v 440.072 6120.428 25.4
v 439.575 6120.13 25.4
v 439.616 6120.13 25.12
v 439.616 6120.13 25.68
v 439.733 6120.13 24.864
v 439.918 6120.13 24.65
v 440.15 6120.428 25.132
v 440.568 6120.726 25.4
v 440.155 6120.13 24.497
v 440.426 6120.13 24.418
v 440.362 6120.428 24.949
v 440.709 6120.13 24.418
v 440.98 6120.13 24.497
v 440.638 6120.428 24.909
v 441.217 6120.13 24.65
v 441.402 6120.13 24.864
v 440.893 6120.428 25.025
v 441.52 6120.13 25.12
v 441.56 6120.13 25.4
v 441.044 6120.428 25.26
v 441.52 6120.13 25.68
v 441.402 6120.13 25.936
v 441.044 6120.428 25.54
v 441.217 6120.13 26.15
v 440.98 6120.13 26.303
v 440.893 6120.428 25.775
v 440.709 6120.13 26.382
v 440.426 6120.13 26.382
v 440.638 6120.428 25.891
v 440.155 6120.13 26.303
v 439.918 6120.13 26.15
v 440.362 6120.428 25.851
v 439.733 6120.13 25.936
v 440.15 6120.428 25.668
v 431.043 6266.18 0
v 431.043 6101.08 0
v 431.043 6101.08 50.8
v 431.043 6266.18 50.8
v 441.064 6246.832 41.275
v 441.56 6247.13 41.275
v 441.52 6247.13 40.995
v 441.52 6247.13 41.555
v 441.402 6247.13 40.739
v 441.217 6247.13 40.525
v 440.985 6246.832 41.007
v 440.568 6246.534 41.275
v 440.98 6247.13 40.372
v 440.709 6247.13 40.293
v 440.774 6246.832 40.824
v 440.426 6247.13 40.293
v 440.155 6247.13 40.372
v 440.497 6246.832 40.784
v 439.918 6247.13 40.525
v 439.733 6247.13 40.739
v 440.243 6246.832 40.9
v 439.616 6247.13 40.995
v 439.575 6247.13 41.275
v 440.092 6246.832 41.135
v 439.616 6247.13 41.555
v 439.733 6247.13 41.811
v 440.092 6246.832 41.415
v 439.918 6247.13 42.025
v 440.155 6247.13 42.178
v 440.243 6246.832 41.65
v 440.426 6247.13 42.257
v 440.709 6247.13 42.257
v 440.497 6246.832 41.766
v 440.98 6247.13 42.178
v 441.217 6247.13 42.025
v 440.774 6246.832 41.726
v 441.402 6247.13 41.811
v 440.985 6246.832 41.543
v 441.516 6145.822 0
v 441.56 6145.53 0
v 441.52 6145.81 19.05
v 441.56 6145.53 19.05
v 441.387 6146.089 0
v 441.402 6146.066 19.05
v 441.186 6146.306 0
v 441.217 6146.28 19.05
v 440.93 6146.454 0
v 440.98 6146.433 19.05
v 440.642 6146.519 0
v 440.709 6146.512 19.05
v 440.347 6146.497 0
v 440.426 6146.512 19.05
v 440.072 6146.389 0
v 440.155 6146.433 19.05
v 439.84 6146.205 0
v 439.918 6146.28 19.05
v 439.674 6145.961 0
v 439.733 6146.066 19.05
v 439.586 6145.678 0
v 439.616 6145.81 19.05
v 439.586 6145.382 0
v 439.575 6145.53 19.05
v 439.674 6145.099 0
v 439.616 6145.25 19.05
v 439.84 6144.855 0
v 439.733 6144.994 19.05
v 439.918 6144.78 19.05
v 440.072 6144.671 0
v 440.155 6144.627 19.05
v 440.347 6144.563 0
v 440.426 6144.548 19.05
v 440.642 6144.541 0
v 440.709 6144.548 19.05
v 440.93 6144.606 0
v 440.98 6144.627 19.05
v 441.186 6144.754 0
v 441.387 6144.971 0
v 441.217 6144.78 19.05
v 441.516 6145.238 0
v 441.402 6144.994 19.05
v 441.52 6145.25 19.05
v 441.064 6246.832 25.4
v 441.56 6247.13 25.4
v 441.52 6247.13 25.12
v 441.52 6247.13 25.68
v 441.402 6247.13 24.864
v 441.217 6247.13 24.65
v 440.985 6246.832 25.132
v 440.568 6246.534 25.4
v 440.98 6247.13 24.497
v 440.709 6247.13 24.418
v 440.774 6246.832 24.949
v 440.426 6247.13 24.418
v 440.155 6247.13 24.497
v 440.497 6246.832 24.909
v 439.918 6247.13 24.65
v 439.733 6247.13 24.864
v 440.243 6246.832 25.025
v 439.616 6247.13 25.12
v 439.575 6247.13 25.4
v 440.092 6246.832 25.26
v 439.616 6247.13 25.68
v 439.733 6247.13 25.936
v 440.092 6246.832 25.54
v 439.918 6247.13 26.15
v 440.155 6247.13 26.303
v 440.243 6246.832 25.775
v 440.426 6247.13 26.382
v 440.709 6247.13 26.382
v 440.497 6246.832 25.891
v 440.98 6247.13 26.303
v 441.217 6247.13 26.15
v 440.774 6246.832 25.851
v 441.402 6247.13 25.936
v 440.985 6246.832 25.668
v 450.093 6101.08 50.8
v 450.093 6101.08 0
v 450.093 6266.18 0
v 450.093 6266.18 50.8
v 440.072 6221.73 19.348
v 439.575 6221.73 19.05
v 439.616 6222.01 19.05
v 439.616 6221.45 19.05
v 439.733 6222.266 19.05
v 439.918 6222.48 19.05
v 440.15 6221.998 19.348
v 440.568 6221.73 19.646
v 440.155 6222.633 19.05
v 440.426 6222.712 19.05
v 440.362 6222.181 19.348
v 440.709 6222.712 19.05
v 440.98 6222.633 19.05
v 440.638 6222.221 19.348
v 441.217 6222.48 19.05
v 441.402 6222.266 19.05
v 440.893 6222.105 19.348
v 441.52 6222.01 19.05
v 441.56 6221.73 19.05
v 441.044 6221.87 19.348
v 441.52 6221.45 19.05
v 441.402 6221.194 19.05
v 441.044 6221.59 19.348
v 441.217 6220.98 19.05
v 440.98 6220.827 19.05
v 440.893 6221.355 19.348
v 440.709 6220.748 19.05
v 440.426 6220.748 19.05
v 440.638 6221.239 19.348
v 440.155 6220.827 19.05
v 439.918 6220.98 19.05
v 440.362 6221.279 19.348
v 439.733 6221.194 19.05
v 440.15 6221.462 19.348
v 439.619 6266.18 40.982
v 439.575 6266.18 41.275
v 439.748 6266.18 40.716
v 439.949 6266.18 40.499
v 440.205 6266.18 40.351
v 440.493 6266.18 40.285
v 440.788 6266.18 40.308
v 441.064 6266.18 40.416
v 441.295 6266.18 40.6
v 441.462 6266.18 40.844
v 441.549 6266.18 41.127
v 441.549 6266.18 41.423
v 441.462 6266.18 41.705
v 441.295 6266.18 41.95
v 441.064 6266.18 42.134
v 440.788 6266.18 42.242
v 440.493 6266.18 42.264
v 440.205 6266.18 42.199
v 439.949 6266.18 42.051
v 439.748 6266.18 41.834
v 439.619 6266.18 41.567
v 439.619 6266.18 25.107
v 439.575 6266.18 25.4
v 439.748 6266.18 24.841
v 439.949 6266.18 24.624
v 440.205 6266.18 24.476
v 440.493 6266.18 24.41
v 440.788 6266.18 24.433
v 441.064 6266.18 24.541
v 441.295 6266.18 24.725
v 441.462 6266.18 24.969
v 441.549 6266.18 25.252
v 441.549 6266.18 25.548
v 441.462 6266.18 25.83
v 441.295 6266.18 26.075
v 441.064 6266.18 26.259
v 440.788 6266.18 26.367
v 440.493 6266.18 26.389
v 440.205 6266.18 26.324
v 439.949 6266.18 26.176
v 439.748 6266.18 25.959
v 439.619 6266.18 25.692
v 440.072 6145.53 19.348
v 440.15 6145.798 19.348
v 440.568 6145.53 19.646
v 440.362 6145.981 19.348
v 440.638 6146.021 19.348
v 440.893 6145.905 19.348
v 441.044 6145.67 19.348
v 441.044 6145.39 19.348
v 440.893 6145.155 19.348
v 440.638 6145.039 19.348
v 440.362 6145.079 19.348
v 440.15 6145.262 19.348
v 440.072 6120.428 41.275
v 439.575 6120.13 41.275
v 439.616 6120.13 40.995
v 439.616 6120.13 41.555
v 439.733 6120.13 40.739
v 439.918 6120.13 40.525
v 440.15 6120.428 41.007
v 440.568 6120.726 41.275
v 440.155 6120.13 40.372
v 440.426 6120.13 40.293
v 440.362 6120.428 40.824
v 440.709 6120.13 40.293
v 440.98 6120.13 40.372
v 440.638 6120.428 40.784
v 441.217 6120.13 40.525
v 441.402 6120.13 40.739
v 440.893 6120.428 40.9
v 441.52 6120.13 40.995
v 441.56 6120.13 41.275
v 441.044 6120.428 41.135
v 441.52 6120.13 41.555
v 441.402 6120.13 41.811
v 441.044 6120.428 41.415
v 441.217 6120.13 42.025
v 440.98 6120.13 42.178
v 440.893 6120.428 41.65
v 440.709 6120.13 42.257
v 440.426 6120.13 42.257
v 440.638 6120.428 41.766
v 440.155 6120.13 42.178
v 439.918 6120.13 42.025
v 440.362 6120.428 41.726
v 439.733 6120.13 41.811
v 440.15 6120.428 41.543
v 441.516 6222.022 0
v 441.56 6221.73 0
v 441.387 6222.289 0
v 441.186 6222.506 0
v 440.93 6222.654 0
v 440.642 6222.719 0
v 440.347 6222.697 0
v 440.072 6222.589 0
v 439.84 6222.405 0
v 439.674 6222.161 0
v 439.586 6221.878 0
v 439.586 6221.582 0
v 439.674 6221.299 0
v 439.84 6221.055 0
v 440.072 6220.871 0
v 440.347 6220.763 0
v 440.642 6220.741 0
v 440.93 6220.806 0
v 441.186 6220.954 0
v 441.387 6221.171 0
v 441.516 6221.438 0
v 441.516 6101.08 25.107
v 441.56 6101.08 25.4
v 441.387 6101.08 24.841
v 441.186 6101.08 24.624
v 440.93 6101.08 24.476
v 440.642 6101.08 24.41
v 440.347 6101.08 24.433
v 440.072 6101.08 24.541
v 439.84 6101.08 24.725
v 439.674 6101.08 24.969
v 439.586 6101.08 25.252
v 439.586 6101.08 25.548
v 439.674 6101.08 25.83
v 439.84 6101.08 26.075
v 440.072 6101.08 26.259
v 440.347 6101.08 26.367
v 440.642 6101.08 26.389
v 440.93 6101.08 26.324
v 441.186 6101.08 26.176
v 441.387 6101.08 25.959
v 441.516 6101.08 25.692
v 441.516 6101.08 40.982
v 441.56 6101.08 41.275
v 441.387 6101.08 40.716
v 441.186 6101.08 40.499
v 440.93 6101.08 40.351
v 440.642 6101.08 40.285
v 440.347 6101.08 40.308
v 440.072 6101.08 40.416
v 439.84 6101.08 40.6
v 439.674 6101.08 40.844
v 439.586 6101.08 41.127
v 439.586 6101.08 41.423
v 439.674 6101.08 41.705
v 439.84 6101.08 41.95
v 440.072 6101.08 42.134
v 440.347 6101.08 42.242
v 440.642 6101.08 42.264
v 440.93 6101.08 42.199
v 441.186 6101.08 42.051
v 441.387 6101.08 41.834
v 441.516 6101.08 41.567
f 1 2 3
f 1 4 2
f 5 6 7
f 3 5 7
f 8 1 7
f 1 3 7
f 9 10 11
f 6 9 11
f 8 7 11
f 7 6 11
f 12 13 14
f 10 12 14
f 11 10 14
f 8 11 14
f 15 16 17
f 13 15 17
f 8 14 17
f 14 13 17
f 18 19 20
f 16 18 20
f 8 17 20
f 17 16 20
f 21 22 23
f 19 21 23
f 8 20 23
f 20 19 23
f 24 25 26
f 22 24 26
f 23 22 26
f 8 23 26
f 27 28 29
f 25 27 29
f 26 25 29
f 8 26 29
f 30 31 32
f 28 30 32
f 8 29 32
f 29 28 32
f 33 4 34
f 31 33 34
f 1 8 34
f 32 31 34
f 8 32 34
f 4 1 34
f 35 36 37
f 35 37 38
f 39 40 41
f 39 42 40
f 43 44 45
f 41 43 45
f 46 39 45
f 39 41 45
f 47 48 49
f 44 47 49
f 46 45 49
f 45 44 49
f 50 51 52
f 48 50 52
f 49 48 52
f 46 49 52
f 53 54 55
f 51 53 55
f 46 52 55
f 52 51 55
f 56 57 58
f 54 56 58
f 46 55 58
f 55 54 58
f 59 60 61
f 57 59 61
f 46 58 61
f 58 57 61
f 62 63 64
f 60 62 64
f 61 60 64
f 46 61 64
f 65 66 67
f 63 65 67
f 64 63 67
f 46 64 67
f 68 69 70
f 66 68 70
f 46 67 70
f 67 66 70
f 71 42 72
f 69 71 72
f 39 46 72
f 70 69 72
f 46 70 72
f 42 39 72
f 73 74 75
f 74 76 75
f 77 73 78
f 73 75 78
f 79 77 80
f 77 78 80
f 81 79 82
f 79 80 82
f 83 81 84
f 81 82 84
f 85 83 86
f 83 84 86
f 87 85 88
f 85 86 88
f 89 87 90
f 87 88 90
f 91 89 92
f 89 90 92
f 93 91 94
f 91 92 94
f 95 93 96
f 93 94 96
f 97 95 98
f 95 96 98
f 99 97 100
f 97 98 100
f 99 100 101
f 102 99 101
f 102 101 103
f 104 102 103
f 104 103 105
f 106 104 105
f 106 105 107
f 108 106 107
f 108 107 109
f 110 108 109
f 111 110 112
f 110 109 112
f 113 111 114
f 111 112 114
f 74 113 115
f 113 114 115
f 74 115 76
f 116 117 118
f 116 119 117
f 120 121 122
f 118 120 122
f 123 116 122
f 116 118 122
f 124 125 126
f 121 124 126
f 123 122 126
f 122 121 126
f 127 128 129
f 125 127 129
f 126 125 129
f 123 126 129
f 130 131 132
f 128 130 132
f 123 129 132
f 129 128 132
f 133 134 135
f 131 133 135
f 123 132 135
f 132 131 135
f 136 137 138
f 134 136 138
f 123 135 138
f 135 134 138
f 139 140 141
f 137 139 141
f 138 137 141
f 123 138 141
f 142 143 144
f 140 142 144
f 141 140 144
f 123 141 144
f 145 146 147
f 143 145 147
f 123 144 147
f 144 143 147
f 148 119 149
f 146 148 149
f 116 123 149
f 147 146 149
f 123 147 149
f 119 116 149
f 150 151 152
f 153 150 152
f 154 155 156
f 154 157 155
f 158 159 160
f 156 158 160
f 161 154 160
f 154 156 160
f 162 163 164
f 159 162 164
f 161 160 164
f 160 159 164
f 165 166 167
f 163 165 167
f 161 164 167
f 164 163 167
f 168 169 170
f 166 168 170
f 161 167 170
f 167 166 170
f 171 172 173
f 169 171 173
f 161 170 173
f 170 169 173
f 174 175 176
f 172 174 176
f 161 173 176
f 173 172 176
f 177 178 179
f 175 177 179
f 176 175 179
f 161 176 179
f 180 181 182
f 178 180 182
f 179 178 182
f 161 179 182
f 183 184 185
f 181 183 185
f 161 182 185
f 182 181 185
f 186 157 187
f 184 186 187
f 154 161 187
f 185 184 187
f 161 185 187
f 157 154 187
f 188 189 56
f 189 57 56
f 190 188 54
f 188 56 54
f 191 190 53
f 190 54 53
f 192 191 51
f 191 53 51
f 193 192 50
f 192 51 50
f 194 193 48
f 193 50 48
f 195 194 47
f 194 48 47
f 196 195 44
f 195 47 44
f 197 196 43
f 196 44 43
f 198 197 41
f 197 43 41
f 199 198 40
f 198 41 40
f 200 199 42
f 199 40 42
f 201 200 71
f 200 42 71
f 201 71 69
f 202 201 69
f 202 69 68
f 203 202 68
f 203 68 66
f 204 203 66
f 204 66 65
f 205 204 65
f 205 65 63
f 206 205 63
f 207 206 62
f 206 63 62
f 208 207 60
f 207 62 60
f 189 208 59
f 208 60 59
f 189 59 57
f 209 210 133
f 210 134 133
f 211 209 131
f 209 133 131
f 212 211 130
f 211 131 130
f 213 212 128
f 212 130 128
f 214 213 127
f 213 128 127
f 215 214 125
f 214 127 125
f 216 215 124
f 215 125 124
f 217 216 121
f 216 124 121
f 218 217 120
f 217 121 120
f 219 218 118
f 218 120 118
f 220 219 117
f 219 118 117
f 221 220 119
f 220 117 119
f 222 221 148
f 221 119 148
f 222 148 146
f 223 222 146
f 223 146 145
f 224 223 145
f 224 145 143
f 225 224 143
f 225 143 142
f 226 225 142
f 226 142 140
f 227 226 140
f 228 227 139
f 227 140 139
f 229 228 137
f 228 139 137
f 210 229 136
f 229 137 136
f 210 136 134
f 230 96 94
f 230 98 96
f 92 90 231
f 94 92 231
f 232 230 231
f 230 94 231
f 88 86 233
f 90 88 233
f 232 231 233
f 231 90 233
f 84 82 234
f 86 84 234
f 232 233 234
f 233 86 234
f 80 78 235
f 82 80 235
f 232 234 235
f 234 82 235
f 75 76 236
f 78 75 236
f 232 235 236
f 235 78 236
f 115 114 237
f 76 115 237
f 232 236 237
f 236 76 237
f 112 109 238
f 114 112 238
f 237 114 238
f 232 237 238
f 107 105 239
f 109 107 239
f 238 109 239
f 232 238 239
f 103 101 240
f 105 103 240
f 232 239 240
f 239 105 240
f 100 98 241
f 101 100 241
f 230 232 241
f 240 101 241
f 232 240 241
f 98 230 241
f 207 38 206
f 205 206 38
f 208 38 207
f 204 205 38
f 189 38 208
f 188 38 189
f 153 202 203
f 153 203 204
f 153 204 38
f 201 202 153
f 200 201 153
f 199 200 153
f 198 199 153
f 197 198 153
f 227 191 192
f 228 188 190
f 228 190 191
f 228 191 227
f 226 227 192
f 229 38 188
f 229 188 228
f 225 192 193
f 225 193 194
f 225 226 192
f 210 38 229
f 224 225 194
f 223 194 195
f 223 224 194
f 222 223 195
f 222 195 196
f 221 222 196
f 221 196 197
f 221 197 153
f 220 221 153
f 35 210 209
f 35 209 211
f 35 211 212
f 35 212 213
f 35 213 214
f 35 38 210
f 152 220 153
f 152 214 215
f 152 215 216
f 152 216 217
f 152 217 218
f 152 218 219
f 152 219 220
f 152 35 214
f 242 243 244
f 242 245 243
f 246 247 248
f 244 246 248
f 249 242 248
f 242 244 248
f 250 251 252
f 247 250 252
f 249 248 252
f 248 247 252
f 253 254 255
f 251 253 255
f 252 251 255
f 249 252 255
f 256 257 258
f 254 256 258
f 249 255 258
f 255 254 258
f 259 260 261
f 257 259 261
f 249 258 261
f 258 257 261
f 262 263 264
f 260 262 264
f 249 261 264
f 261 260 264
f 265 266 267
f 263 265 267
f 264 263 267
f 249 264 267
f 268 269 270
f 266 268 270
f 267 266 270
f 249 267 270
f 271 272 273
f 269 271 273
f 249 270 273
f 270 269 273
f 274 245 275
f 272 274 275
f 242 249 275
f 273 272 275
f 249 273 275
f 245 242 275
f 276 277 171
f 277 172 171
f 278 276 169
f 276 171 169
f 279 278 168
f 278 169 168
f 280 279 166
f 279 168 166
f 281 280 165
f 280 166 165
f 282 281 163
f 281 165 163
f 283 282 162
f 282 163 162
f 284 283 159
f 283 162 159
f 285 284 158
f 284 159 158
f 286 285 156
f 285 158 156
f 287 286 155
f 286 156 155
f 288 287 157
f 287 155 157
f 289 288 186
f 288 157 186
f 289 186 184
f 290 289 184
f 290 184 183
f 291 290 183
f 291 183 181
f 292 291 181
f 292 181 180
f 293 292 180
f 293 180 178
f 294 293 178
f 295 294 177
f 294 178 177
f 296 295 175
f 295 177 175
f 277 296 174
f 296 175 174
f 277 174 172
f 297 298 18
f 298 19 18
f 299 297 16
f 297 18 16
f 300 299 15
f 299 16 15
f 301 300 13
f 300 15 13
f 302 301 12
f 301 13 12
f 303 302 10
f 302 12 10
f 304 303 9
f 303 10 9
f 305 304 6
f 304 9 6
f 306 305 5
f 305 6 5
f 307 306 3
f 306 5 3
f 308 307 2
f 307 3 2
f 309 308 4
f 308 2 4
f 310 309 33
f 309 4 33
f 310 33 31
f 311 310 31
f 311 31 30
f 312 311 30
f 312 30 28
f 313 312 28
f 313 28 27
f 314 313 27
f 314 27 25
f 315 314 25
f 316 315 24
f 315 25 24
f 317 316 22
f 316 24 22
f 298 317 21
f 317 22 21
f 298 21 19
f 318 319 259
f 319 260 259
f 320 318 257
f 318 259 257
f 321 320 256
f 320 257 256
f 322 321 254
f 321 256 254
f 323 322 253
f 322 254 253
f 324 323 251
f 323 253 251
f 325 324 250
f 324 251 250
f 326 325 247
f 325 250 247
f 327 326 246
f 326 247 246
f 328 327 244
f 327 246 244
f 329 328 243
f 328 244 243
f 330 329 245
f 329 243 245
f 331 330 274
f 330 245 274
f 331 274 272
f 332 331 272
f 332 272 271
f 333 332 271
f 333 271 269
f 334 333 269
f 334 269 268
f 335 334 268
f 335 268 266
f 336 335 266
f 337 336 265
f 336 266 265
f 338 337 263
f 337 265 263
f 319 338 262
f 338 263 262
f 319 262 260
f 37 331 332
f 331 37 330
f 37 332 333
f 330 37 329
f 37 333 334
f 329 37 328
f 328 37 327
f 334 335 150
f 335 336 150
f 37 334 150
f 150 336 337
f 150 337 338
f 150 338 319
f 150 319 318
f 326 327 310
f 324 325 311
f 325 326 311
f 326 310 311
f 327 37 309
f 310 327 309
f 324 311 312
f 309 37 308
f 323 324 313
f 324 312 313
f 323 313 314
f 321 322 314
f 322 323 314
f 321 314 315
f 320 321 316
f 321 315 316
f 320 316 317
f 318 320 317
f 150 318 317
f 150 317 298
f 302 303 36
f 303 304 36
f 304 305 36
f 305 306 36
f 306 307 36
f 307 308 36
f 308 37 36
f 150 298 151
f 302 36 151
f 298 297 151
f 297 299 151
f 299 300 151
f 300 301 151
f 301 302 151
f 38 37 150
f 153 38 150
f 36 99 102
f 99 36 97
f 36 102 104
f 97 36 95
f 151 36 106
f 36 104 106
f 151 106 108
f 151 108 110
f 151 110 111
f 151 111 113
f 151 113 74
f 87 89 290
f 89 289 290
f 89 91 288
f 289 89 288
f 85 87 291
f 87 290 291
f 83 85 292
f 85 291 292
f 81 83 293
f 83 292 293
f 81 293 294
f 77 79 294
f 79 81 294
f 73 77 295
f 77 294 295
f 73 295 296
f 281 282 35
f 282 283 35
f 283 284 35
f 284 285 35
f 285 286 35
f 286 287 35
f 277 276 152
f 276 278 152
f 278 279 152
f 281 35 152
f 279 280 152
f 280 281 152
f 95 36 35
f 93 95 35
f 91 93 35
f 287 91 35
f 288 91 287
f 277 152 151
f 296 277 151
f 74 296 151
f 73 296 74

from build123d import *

# Parameters (mm, degrees)
SKETCH1_W                           = 19.05
SKETCH1_H                           = 165.099999729
BOSS_EXTRUDE1_DEPTH                 = 50.8
F_5_64_0_07813_DIAMETER_HOLE1_D     = 1.984502
F_5_64_0_07813_DIAMETER_HOLE1_DEPTH = 38.1
F_5_64_0_07813_DIAMETER_HOLE1_TIP   = 0.59620455
F_5_64_0_07813_DIAMETER_HOLE2_D     = 1.984502
F_5_64_0_07813_DIAMETER_HOLE2_DEPTH = 19.05
F_5_64_0_07813_DIAMETER_HOLE2_TIP   = 0.59620455
F_5_64_0_07813_DIAMETER_HOLE3_D     = 1.984502
F_5_64_0_07813_DIAMETER_HOLE3_DEPTH = 19.05
F_5_64_0_07813_DIAMETER_HOLE3_TIP   = 0.59620455


with BuildPart() as part:
    # Sketch1 → Boss-Extrude1 (new body)
    with BuildSketch(Plane.XY):
        with Locations((440.567640906, 6183.630000136)):
            Rectangle(SKETCH1_W, SKETCH1_H)
    extrude(amount=BOSS_EXTRUDE1_DEPTH)

    # 5/64 (0.07813) Diameter Hole1
    with Locations(Plane(origin=(4.968994719, 3.22e-07, -19.050107671), x_dir=(-1, 0, 0), z_dir=(0, 0, -1))):
        with Locations((-481.589248274, 6993.254992531), (-386.339248274, 6993.254992531), (-291.089248274, 6993.254992531), (-295.274999999, 6965.135938475), (-295.274999999, 6812.735938475), (-295.274999999, 6660.335938474), (-285.166362357, 6631.468843414), (-475.477307398, 6631.468752771), (-485.002307398, 6660.335938474), (-485.002307398, 6812.735938474), (-485.002307398, 6965.135938474), (-478.365617646, 6611.6708), (-287.865617646, 6611.6708), (-307.975, 6564.3379), (-307.975, 6488.1379), (-284.960913066, 6440.805), (-380.210913066, 6440.805), (-475.460913066, 6440.805), (-446.831312422, 6488.1379), (-446.831312422, 6564.3379), (-472.231312422, 6396.355), (-472.231312422, 6320.155), (-472.653156211, 6275.705000839), (-377.403156211, 6275.705000839), (-282.153156211, 6275.705000839), (-282.575, 6320.155), (-282.575, 6396.355), (-435.598646187, 6221.729999816), (-435.598646187, 6145.529999816), (-450.592518112, 6091.554999951), (-460.998646187, 6091.555478285), (-460.998646187, 6056.629999944), (-460.998646187, 5980.429999944), (-460.998646187, 5945.505000042), (-282.153156211, 5945.505000042), (-368.611823093, 5945.505000042)):
            Hole(F_5_64_0_07813_DIAMETER_HOLE1_D / 2, depth=F_5_64_0_07813_DIAMETER_HOLE1_DEPTH)
            with Locations((0, 0, -(F_5_64_0_07813_DIAMETER_HOLE1_DEPTH + F_5_64_0_07813_DIAMETER_HOLE1_TIP / 2))):  # 118° drill point
                Cone(0, F_5_64_0_07813_DIAMETER_HOLE1_D / 2, F_5_64_0_07813_DIAMETER_HOLE1_TIP, mode=Mode.SUBTRACT)

    # 5/64 (0.07813) Diameter Hole2
    with Locations(Plane(origin=(0, 6101.080000271, 0), x_dir=(-1, 0, 0), z_dir=(0, -1, 0))):
        with Locations((-440.567640906, -41.274956045), (-440.567640906, -25.399956045)):
            Hole(F_5_64_0_07813_DIAMETER_HOLE2_D / 2, depth=F_5_64_0_07813_DIAMETER_HOLE2_DEPTH)
            with Locations((0, 0, -(F_5_64_0_07813_DIAMETER_HOLE2_DEPTH + F_5_64_0_07813_DIAMETER_HOLE2_TIP / 2))):  # 118° drill point
                Cone(0, F_5_64_0_07813_DIAMETER_HOLE2_D / 2, F_5_64_0_07813_DIAMETER_HOLE2_TIP, mode=Mode.SUBTRACT)

    # 5/64 (0.07813) Diameter Hole3
    with Locations(Plane(origin=(0, 6266.18, 0), x_dir=(1, 0, 0), z_dir=(0, 1, 0))):
        with Locations((440.567640906, -25.399956045), (440.567640906, -41.274956045)):
            Hole(F_5_64_0_07813_DIAMETER_HOLE3_D / 2, depth=F_5_64_0_07813_DIAMETER_HOLE3_DEPTH)
            with Locations((0, 0, -(F_5_64_0_07813_DIAMETER_HOLE3_DEPTH + F_5_64_0_07813_DIAMETER_HOLE3_TIP / 2))):  # 118° drill point
                Cone(0, F_5_64_0_07813_DIAMETER_HOLE3_D / 2, F_5_64_0_07813_DIAMETER_HOLE3_TIP, mode=Mode.SUBTRACT)


solid = part.part
